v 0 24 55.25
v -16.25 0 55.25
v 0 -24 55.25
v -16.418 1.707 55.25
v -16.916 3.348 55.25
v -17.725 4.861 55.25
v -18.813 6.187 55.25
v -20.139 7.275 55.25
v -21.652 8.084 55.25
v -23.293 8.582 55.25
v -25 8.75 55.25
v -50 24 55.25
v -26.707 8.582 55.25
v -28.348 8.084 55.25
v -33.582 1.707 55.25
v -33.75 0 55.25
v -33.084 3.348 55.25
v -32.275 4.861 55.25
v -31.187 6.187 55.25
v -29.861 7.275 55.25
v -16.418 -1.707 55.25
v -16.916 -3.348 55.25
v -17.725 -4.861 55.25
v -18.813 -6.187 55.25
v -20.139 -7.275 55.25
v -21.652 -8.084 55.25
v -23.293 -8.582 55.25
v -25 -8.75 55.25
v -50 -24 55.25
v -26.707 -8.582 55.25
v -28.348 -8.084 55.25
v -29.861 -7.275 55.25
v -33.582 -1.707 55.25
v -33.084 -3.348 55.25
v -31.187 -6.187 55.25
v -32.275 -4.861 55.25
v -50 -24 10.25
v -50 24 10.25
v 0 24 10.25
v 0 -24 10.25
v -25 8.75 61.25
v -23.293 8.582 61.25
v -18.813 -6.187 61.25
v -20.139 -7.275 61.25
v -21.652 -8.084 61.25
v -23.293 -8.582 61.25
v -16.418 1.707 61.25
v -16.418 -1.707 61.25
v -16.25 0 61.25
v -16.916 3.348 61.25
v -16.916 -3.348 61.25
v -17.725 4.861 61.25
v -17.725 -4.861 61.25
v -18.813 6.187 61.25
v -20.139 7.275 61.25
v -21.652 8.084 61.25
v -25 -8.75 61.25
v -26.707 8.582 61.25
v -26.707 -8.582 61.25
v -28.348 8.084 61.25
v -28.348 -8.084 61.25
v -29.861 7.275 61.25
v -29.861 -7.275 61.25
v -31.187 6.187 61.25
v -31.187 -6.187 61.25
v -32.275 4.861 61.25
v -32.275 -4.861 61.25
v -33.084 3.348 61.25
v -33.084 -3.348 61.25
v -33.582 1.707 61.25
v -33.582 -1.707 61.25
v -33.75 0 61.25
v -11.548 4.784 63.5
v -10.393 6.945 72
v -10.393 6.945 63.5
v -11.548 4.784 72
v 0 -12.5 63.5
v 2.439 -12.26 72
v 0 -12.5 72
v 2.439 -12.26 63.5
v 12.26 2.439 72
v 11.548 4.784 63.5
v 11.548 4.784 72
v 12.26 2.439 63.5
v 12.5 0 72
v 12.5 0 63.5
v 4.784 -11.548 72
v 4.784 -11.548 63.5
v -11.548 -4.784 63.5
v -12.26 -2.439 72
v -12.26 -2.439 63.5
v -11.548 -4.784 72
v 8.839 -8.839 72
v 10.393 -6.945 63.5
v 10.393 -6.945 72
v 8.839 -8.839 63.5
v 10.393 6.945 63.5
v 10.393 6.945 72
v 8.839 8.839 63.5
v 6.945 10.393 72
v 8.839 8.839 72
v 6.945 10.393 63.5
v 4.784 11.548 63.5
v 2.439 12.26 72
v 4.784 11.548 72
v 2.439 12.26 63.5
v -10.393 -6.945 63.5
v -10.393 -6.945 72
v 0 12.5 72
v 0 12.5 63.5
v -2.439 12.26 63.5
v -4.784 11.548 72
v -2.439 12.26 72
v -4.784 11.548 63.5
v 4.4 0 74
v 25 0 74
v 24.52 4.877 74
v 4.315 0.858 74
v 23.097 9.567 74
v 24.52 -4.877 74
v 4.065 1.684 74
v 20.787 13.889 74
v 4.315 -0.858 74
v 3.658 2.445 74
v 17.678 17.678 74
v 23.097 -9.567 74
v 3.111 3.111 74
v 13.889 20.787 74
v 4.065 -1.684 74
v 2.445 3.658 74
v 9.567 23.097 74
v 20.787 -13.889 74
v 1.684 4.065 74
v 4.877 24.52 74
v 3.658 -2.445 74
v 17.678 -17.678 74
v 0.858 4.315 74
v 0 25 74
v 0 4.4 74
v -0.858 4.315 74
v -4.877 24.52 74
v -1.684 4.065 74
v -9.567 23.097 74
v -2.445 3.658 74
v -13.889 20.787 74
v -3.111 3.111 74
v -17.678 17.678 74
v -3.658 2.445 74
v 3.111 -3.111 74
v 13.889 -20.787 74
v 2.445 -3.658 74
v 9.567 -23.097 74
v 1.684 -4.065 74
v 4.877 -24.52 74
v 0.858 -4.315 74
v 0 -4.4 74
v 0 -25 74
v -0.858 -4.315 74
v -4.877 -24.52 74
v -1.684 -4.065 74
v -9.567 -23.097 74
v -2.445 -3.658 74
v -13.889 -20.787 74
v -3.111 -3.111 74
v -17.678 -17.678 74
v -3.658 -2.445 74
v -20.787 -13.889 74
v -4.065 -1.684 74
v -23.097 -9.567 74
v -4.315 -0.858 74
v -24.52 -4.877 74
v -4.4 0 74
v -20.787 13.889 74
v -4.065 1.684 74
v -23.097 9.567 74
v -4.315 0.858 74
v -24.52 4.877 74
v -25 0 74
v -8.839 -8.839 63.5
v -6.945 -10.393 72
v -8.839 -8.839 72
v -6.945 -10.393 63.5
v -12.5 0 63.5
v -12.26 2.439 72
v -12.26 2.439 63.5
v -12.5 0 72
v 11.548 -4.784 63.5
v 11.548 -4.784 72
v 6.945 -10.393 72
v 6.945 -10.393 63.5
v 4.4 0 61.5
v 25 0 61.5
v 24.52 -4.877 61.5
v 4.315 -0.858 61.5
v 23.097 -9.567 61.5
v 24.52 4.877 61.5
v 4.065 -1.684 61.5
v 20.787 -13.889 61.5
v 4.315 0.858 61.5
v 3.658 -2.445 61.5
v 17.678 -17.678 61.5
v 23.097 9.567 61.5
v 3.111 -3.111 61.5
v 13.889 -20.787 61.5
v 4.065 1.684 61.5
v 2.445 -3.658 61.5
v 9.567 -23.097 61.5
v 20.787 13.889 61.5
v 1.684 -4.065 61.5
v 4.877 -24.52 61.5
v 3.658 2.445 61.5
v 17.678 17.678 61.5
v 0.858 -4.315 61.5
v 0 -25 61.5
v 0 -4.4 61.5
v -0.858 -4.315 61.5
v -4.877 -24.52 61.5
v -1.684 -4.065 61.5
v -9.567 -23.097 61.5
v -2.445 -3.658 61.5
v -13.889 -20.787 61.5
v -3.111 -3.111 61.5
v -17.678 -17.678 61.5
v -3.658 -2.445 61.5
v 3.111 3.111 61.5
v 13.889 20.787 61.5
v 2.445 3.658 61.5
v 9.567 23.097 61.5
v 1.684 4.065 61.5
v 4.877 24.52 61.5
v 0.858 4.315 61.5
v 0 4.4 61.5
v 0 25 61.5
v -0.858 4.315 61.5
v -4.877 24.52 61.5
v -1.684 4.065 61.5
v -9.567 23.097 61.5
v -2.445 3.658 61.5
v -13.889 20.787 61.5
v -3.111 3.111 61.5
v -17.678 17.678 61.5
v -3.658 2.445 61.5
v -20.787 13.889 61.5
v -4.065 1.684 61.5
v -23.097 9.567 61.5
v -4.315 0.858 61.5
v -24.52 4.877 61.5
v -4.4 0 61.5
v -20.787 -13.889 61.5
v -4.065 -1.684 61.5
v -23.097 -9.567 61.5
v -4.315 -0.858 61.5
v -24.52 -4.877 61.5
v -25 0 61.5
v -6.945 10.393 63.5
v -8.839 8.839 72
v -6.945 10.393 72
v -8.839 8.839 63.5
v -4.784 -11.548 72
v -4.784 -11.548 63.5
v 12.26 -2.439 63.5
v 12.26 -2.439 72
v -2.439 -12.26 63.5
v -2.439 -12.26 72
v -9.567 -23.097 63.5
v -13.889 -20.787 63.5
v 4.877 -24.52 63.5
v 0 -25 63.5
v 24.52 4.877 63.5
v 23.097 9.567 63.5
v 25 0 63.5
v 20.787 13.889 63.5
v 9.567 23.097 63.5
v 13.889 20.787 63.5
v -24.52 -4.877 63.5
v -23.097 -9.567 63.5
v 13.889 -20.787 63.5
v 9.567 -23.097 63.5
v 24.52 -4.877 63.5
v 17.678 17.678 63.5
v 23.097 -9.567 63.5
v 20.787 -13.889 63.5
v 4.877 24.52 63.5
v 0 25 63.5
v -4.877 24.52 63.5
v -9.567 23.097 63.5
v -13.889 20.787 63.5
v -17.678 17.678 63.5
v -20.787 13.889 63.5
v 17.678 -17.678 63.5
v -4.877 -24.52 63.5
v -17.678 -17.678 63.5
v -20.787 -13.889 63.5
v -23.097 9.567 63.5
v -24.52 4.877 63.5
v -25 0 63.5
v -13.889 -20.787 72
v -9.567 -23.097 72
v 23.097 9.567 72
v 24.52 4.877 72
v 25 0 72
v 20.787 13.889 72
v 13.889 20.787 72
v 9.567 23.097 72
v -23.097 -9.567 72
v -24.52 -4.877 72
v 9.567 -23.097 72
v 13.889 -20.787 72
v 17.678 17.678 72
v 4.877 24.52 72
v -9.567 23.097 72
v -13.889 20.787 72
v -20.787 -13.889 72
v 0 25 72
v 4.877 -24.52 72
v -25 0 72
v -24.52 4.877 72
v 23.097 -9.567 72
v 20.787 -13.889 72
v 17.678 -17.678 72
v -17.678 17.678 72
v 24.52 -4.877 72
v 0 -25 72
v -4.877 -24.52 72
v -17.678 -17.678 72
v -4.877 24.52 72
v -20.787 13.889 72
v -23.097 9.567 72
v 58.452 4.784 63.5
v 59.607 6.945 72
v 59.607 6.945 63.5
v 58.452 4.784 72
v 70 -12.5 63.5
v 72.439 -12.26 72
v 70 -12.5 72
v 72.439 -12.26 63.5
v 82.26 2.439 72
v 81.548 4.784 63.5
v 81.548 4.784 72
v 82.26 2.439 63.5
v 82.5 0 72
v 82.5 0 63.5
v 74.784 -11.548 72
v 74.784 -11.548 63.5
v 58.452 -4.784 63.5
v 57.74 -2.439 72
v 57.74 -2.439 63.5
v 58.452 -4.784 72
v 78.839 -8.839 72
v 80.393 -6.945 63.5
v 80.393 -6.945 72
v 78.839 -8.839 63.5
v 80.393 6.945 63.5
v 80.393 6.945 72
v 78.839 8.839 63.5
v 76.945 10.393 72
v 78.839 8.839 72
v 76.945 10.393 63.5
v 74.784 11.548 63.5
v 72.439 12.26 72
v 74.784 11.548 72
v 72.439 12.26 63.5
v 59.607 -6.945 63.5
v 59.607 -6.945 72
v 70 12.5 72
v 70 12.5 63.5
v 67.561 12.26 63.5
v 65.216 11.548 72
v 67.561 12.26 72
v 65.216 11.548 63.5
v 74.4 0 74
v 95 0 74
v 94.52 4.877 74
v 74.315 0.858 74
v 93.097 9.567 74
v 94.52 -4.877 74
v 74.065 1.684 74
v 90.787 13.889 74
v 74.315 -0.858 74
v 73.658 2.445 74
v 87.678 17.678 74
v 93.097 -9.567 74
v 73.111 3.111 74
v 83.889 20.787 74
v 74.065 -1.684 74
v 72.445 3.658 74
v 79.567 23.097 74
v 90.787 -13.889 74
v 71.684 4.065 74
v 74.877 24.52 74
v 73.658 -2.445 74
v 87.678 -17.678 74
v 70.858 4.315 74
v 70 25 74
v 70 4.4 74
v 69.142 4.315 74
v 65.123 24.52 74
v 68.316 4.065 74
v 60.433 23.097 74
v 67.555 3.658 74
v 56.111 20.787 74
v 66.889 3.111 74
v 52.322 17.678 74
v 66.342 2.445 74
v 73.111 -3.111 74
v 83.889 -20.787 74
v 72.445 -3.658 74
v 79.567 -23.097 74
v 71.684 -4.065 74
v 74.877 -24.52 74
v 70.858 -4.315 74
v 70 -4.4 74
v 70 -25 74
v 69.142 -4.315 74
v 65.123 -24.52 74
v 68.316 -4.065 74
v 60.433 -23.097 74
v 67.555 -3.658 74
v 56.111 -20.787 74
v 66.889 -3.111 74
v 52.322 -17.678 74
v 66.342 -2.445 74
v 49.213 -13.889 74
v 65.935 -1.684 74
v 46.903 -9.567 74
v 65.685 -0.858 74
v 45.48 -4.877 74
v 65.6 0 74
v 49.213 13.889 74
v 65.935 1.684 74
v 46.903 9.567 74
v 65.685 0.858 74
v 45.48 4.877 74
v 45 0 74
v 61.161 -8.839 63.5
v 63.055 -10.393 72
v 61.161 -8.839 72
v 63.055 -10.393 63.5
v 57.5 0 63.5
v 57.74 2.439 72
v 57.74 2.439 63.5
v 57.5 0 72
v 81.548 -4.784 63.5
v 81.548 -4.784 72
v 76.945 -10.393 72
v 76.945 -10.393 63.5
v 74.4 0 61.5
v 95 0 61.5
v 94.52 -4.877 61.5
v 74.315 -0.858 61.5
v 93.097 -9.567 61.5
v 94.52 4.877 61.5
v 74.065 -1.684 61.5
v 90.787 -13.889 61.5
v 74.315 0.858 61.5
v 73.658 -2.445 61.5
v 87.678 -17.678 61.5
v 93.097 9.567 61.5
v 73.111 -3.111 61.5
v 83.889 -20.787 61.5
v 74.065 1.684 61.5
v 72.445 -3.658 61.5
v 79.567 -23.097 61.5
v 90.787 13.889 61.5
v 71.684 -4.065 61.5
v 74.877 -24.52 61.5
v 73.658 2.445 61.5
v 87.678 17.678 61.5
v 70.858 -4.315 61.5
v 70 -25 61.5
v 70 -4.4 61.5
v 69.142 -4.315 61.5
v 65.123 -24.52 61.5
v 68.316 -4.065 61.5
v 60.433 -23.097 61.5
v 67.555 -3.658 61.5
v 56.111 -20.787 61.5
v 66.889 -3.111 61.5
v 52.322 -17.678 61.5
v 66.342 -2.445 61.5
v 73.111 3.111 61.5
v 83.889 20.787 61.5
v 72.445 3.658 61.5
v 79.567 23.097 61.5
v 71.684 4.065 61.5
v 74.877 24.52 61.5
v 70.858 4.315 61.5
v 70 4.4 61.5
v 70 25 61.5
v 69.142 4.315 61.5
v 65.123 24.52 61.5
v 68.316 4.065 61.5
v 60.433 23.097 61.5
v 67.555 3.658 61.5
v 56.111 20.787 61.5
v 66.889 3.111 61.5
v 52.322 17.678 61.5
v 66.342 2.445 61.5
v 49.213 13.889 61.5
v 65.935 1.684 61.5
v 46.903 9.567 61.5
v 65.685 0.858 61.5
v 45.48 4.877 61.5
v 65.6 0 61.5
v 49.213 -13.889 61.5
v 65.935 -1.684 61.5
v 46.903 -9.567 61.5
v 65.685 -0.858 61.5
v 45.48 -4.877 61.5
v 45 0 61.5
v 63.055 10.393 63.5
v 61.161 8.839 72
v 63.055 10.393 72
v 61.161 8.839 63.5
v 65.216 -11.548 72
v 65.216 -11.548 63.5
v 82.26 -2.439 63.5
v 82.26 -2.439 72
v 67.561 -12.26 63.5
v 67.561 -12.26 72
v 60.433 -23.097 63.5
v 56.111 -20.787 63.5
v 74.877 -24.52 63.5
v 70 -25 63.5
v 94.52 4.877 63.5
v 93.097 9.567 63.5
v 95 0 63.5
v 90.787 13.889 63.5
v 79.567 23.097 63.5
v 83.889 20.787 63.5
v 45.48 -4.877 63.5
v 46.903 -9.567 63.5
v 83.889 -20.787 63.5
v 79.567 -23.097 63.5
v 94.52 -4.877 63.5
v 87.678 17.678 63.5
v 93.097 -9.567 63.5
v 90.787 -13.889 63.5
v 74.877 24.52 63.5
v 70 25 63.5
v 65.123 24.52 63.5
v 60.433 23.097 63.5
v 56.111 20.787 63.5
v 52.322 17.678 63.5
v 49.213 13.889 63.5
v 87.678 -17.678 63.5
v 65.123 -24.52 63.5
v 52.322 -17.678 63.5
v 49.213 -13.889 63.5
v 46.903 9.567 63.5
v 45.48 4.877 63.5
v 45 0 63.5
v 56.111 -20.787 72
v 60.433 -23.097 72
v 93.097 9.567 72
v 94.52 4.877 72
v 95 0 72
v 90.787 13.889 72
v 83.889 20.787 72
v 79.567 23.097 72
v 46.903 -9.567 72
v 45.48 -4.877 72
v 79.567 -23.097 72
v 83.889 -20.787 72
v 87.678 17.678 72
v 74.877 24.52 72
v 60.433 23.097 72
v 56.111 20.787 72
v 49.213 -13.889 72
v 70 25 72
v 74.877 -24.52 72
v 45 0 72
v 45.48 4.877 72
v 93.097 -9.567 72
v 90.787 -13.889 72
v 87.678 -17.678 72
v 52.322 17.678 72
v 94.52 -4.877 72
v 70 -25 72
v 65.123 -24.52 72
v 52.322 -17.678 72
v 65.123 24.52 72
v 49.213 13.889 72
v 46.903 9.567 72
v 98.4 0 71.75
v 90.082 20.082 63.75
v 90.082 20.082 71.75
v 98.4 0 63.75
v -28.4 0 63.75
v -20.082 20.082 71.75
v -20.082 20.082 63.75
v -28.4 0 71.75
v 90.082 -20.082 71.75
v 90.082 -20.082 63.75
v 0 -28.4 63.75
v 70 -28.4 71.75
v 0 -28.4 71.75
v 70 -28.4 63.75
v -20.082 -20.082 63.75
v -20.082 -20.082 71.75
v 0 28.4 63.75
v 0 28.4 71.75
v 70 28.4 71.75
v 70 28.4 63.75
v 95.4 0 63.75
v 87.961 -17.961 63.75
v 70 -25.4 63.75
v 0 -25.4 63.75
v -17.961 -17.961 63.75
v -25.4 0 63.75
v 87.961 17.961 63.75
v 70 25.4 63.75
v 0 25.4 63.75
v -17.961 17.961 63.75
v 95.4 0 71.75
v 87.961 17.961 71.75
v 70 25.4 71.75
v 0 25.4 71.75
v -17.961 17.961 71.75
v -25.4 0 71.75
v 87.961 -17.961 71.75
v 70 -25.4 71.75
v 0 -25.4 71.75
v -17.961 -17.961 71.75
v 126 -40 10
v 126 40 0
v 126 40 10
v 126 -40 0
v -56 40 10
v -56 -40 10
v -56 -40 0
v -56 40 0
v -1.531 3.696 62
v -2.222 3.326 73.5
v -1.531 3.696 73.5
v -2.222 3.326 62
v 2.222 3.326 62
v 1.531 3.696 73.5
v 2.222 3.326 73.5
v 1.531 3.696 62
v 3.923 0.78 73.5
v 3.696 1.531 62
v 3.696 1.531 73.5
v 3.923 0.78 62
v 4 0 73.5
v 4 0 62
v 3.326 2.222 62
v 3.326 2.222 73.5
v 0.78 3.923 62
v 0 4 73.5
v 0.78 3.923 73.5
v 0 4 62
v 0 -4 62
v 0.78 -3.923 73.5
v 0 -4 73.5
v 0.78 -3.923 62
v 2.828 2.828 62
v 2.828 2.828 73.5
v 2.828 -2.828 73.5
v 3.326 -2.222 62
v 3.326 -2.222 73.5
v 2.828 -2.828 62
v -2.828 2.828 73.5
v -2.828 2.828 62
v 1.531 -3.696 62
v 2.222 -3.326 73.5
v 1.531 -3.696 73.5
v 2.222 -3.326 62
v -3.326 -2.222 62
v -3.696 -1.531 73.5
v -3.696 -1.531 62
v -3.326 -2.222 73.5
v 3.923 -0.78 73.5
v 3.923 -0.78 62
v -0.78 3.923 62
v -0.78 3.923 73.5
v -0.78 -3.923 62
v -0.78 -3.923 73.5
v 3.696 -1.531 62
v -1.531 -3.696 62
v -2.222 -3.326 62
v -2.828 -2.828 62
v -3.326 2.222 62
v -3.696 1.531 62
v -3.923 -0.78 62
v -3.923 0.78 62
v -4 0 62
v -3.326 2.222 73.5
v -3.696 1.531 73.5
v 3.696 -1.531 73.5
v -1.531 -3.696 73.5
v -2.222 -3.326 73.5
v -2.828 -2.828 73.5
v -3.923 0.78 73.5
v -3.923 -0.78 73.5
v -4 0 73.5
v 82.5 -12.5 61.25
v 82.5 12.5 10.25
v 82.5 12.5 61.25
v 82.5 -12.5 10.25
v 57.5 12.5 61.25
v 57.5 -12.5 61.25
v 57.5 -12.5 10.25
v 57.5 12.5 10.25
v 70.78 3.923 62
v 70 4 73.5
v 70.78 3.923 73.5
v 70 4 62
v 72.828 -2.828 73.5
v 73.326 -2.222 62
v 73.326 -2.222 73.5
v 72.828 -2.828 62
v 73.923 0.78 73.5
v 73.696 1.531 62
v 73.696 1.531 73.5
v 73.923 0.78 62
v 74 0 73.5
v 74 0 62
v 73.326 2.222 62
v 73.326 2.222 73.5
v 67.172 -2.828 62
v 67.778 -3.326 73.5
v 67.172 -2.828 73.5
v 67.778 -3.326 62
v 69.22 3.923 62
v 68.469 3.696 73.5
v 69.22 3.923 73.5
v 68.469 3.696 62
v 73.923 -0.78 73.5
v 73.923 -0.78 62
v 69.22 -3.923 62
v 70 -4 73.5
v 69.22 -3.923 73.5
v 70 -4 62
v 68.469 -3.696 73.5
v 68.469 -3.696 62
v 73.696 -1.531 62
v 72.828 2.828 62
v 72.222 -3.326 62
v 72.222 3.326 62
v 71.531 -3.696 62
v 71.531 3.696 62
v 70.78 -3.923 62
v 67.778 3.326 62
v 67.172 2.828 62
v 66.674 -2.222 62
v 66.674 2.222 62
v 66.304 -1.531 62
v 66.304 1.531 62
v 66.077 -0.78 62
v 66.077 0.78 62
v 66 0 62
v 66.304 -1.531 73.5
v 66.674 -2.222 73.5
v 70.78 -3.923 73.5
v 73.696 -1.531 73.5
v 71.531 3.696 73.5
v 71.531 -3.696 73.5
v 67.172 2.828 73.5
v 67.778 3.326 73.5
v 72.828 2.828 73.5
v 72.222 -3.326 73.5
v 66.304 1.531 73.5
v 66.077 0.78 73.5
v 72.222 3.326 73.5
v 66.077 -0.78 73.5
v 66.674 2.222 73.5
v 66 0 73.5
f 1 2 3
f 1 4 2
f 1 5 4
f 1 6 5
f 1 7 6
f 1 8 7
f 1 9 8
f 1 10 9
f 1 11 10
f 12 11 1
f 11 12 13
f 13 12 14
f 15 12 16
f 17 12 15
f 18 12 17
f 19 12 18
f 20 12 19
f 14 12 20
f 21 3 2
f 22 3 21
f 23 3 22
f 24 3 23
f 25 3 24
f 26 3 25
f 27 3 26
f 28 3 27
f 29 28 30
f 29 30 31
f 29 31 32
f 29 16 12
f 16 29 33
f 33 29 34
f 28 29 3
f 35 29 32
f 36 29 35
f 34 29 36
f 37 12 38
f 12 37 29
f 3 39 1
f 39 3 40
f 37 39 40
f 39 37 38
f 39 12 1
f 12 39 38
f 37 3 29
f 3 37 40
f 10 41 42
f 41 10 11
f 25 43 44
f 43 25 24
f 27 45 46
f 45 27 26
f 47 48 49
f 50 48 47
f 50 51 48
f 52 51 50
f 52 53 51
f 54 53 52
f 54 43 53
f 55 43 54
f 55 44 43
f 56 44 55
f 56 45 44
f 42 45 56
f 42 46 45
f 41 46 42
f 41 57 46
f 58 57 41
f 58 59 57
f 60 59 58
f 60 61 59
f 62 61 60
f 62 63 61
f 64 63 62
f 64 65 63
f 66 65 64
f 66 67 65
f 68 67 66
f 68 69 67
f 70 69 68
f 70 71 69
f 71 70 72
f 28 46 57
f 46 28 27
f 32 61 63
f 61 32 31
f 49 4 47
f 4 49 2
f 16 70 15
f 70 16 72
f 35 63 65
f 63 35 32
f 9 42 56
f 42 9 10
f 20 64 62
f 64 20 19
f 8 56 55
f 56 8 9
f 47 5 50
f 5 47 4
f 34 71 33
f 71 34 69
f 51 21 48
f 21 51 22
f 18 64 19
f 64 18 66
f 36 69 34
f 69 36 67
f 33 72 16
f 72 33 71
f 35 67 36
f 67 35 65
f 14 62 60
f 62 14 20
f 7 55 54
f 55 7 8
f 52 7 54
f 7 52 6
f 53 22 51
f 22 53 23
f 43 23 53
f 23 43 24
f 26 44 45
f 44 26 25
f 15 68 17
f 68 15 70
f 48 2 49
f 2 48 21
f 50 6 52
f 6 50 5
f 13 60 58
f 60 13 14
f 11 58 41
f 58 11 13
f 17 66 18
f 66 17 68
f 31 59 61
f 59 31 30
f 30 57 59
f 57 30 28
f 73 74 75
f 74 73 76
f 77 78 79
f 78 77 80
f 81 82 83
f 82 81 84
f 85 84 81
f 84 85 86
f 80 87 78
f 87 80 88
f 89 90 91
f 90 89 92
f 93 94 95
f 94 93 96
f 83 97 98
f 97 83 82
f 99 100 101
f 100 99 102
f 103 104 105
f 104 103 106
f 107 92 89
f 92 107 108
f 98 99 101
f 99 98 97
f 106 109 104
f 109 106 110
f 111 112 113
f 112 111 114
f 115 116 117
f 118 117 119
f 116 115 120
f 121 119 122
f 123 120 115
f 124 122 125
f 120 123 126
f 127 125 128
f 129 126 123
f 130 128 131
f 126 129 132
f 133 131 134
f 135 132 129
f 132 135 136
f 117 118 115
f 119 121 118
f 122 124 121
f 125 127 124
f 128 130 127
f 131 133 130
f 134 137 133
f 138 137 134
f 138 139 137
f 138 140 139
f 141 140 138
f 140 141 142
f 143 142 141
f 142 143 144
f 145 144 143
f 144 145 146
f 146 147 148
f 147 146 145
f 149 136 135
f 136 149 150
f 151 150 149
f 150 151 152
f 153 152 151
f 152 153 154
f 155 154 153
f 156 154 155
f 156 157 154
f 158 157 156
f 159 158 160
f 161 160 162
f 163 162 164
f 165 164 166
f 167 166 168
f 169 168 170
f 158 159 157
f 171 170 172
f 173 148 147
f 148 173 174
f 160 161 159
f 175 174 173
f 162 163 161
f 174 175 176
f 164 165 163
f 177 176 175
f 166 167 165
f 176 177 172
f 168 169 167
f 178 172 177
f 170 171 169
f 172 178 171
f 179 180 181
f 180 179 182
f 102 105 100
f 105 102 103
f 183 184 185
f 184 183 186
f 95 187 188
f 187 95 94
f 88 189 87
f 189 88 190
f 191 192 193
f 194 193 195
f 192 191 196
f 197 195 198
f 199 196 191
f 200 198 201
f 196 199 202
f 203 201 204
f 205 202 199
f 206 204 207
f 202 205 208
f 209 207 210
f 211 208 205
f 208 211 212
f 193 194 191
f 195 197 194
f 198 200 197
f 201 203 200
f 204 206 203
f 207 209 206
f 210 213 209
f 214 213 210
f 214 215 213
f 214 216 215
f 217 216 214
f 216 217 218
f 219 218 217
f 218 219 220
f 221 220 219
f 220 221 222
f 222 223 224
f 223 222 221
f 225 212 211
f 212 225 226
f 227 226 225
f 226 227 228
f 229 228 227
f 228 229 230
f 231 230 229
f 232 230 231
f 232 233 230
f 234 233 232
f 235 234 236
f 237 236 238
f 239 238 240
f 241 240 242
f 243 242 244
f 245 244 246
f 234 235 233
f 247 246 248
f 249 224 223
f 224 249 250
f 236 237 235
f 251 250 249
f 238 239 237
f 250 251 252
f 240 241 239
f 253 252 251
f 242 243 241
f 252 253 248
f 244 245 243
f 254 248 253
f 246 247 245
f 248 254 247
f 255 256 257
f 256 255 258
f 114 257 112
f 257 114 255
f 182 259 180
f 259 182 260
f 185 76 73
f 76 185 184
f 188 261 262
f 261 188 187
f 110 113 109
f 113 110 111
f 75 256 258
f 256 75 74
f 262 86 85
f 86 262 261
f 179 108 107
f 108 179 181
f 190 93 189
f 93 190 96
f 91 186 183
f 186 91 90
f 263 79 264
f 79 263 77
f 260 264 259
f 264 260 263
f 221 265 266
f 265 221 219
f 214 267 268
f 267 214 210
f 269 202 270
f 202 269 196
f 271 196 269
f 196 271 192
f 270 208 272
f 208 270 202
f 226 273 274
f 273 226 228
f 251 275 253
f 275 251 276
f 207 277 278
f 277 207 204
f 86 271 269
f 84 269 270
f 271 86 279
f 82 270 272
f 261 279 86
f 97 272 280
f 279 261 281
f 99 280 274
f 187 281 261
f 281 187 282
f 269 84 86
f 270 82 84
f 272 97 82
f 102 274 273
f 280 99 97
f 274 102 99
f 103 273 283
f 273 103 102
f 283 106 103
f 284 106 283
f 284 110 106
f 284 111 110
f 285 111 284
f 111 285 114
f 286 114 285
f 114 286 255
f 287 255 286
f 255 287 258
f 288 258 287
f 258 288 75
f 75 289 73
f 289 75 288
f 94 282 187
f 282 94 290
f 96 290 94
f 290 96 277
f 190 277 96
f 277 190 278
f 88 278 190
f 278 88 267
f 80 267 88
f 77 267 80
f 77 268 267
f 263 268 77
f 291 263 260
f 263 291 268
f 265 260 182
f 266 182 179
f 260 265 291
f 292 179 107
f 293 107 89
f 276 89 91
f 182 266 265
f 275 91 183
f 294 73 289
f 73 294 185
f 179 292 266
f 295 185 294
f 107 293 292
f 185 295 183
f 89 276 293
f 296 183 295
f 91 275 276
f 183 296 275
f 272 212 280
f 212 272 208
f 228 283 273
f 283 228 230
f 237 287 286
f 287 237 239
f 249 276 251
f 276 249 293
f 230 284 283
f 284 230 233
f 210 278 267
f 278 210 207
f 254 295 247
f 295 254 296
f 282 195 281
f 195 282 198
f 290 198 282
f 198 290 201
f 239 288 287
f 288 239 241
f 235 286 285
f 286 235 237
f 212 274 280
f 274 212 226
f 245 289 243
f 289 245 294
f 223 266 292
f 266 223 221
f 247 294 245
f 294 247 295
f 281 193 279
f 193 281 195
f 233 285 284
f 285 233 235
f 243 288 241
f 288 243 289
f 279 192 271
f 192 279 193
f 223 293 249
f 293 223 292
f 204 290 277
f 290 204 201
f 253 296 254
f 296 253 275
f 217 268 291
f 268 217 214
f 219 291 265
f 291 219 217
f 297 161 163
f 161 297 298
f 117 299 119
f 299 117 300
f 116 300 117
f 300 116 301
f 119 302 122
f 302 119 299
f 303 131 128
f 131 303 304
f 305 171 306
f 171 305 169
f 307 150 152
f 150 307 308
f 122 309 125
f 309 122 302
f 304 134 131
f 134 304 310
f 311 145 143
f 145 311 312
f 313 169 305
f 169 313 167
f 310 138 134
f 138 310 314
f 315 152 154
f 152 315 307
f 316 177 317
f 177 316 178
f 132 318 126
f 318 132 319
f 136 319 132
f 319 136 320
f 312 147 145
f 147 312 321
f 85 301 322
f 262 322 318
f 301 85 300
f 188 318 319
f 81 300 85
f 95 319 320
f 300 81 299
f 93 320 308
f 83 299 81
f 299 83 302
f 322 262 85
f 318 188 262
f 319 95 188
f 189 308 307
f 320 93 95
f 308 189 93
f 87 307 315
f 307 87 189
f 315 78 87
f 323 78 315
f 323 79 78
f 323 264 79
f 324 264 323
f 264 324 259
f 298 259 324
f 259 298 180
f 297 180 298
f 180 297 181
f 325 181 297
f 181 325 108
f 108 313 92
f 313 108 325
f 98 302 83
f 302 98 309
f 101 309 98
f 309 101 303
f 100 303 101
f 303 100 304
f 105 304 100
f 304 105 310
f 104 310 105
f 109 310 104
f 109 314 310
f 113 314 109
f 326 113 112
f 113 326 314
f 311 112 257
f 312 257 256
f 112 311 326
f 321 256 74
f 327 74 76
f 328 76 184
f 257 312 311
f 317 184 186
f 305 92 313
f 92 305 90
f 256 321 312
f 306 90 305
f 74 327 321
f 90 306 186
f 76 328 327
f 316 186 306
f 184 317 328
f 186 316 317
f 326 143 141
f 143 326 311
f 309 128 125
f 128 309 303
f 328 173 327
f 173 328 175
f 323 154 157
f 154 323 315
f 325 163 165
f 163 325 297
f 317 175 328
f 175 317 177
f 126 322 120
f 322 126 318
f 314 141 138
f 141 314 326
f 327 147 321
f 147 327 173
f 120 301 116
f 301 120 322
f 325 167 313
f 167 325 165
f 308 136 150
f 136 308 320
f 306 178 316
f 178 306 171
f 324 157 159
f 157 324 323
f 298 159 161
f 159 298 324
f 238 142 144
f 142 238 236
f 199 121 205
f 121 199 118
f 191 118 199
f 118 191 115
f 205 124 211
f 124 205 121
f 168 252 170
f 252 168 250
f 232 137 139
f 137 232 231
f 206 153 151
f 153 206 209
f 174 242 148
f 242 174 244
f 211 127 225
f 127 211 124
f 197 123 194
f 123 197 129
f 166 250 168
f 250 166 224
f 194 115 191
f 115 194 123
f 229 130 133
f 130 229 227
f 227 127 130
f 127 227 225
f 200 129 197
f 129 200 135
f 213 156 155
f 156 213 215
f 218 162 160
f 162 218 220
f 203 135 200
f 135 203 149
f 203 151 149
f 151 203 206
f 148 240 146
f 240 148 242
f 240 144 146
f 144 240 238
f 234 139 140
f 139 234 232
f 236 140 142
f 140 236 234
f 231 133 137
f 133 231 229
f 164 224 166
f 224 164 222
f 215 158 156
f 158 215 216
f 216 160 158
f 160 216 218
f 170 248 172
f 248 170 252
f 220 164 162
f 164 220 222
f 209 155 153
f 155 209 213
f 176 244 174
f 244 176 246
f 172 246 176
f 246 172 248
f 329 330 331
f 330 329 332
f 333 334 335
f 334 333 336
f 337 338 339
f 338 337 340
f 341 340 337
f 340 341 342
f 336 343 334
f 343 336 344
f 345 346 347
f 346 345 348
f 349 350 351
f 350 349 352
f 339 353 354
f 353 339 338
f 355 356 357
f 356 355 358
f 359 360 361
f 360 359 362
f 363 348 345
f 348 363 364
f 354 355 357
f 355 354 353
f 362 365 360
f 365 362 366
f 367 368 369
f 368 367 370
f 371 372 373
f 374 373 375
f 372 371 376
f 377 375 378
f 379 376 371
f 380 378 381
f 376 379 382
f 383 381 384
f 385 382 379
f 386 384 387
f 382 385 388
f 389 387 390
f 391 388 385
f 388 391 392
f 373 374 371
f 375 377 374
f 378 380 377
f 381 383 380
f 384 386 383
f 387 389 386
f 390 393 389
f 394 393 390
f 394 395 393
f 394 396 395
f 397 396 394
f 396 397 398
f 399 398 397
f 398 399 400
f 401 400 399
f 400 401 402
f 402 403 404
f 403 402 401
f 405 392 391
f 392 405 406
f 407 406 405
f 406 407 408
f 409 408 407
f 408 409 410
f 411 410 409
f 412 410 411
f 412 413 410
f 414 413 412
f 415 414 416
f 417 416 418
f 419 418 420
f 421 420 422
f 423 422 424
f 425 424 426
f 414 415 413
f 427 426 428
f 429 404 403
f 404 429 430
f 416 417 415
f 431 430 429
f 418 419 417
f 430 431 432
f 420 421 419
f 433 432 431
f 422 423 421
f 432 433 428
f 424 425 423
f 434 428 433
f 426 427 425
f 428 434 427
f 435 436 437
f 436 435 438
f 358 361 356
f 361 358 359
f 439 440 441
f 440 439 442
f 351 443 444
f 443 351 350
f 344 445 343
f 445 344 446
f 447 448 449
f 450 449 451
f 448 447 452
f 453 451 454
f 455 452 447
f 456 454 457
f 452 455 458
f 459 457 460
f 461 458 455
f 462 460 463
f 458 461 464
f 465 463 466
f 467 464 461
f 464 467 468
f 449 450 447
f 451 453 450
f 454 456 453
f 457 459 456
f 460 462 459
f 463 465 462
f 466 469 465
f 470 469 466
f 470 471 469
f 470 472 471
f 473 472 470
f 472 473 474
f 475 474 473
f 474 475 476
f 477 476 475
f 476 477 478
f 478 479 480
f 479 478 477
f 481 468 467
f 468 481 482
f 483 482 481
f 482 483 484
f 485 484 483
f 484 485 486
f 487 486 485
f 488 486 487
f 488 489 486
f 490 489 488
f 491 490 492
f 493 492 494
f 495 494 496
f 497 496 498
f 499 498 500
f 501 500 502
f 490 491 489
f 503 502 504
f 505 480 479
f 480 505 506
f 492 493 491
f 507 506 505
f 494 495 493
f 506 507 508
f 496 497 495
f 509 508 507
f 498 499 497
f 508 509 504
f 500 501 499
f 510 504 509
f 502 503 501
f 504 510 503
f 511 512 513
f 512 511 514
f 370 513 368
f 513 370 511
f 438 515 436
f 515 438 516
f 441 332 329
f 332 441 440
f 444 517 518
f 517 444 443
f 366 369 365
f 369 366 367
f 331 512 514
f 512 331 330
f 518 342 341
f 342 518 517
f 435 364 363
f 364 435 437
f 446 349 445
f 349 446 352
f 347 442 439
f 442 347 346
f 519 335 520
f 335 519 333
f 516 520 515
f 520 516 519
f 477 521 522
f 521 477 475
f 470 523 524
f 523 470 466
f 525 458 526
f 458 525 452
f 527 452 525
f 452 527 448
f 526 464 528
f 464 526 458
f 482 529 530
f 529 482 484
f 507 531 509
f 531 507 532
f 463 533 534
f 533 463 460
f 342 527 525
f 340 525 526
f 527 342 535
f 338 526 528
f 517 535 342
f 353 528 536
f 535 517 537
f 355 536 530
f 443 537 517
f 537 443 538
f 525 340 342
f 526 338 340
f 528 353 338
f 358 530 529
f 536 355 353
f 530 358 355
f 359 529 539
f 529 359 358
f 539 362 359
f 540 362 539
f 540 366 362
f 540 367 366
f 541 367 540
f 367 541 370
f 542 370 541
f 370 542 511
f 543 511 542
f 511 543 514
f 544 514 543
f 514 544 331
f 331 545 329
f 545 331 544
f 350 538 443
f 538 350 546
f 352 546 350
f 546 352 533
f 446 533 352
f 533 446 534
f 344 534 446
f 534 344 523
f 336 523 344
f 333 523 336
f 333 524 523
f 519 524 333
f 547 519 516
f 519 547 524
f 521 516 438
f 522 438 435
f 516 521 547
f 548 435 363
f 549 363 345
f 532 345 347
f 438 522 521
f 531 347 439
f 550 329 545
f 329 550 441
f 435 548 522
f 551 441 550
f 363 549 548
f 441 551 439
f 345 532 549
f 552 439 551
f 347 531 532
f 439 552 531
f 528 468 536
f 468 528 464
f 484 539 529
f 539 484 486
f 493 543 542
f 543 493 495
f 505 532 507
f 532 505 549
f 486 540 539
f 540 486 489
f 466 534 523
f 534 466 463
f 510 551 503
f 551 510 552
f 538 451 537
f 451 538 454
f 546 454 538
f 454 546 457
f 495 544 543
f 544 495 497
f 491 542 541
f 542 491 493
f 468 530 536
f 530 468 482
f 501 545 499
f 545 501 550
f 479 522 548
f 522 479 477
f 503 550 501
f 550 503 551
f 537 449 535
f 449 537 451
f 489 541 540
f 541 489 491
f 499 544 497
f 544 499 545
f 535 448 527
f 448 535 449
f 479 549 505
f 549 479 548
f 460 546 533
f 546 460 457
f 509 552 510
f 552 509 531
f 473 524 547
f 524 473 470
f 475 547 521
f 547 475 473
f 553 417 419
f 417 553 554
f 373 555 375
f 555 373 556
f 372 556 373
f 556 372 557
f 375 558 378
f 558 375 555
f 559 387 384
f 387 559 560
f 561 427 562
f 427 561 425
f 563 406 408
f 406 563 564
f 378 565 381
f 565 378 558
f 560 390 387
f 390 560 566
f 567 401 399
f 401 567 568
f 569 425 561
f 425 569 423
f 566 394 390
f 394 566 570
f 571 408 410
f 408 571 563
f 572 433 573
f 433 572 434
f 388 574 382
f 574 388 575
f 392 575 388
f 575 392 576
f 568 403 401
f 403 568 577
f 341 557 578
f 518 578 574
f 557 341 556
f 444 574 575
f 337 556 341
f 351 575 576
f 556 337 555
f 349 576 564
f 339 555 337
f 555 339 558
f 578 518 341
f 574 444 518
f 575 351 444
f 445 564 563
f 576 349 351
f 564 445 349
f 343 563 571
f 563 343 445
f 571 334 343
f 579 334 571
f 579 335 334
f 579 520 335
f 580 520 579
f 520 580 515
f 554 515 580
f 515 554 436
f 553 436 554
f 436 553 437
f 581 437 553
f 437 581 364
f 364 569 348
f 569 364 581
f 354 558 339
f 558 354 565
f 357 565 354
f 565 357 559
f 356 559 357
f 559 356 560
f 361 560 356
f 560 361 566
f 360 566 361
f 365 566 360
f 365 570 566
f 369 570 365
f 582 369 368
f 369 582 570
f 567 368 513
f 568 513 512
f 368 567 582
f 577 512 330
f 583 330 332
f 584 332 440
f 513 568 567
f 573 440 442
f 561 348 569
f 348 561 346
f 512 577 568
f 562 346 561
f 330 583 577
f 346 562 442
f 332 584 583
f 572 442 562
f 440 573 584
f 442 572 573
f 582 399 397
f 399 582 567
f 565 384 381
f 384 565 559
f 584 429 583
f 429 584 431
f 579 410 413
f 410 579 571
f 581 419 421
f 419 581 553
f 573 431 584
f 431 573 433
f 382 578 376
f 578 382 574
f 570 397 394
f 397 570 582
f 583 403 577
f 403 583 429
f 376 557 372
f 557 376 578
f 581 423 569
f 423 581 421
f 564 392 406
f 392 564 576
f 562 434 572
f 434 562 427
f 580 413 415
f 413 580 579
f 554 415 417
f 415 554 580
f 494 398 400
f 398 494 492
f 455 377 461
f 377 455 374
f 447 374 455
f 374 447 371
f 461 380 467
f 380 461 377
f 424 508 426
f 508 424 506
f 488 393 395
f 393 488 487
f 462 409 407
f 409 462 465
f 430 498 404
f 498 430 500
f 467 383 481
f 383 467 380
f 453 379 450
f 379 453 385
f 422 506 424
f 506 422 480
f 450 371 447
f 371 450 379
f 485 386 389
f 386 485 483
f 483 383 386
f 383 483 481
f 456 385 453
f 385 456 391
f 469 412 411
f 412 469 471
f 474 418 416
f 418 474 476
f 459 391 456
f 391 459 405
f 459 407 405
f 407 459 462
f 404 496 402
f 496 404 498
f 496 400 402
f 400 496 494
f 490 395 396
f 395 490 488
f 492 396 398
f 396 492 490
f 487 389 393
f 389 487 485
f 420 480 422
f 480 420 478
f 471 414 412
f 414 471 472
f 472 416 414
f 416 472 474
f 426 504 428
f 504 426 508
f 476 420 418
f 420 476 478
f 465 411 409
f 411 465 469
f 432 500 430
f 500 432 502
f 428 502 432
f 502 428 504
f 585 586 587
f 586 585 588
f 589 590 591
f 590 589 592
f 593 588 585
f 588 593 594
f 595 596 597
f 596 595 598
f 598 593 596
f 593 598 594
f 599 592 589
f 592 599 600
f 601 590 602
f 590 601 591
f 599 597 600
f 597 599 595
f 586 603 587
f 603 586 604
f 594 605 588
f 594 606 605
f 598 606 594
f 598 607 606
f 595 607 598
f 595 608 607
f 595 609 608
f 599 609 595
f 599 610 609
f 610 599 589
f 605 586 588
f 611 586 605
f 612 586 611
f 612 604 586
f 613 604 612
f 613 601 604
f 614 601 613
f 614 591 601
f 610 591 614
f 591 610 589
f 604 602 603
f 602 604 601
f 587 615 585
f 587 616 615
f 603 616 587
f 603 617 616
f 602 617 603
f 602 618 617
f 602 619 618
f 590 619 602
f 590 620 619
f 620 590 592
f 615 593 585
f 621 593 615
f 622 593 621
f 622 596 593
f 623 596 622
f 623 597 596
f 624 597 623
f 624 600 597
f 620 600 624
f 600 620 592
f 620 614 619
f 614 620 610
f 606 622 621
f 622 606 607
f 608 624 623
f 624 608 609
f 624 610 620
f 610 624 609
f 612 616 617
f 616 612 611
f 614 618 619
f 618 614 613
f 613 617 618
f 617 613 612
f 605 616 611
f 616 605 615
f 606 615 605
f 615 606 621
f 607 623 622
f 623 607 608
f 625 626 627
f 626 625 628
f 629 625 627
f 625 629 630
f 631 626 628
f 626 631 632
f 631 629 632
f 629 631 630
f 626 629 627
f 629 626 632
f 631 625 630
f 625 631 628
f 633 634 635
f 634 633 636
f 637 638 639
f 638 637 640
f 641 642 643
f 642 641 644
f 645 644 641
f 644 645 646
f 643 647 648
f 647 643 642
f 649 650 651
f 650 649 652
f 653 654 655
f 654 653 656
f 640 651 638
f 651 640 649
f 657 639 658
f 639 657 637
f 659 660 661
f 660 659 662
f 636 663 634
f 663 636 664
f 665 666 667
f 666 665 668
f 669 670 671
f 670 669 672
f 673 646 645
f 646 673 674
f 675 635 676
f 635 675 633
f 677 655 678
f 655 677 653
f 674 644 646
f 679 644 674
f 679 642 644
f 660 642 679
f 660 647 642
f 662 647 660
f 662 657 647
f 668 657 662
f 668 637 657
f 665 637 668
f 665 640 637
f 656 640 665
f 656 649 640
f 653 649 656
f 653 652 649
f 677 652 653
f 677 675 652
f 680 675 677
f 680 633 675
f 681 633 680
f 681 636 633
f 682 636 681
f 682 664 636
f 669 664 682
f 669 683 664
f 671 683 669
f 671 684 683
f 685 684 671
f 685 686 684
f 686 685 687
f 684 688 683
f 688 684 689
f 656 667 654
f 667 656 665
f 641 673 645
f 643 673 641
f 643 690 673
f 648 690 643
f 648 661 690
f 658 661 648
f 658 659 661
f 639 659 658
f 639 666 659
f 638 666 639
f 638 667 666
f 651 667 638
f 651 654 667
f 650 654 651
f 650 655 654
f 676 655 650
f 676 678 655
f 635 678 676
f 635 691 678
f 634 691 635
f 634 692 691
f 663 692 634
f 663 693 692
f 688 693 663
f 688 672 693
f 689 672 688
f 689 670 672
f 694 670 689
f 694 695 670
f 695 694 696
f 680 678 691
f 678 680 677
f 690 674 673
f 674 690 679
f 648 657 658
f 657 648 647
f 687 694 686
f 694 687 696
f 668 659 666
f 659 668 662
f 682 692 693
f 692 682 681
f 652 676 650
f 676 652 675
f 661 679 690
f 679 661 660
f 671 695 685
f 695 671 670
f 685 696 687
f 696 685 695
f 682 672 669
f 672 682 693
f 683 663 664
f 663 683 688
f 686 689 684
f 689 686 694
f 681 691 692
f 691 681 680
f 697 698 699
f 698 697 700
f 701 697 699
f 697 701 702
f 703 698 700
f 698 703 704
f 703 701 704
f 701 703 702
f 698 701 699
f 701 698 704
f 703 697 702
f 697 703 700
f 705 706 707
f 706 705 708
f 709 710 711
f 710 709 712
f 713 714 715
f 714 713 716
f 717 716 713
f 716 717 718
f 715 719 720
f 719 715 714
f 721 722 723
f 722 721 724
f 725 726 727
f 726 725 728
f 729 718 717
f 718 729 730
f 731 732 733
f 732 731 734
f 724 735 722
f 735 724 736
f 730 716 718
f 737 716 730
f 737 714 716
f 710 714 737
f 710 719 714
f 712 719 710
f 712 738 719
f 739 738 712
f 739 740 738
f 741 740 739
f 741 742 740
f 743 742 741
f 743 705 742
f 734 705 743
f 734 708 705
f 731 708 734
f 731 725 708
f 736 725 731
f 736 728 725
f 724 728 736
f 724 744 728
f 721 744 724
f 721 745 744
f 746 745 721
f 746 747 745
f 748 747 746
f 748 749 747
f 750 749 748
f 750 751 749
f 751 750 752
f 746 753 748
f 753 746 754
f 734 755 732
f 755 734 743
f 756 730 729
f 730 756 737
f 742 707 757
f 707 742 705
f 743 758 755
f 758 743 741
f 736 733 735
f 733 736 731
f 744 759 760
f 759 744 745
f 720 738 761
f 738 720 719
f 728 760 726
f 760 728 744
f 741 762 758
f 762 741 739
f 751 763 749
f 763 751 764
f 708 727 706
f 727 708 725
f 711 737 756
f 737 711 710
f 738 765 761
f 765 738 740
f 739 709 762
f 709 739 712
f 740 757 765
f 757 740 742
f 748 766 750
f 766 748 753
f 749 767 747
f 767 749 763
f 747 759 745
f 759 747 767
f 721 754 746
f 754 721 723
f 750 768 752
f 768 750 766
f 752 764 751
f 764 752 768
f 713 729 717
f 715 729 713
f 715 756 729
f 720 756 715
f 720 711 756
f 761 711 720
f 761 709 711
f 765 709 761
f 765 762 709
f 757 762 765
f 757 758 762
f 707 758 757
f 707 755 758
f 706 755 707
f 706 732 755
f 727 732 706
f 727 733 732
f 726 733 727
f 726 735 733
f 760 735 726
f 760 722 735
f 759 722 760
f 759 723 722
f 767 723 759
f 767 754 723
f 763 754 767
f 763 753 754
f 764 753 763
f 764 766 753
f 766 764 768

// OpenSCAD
$fn = 32;

// ------------------------------------------------------------------------
// Motor belt drive: span 70 mm, pulleys d50, belt 8 mm wide
// Every part is its own module, assembly() places every instance.
// ------------------------------------------------------------------------

// --- part 1 ---
module base_plate() {
  difference() {
    translate([-91, -40, 0]) cube([182, 80, 10]);
  }
}

// --- part 2 ---
module motor() {
  union() {
    translate([-22.5, -24, 0]) cube([45, 48, 50]);
    translate([25.5, 0, 25]) rotate([0, 90, 0]) cylinder(h = 6, d = 17.5, center = true);
  }
}

// --- part 3 ---
module drive_shaft() {
  translate([0, 0, -5.75]) cylinder(h = 11.5, d = 8);
}

// --- part 4 ---
module pulley_drive() {
  difference() {
    union() {
      cylinder(h = 12.5, d = 25);
      cylinder(h = 2, d = 50);
      translate([0, 0, 10.5]) cylinder(h = 2, d = 50);
    }
    translate([0, 0, -1]) cylinder(h = 14.5, d = 8.8);
  }
}

// --- part 5 ---
module idler_post() {
  translate([-12.5, -12.5, 0]) cube([25, 25, 51]);
}

// --- part 6 ---
module driven_shaft() {
  translate([0, 0, -5.75]) cylinder(h = 11.5, d = 8);
}

// --- part 7 ---
module pulley_driven() {
  difference() {
    union() {
      cylinder(h = 12.5, d = 25);
      cylinder(h = 2, d = 50);
      translate([0, 0, 10.5]) cylinder(h = 2, d = 50);
    }
    translate([0, 0, -1]) cylinder(h = 14.5, d = 8.8);
  }
}

// --- part 8 ---
module drive_belt() {
  difference() {
    linear_extrude(height = 8) polygon(points = concat([for (a = [90 : 45 : 270]) [28.4 * cos(a), 28.4 * sin(a)]], [for (a = [270 : 45 : 450]) [70 + 28.4 * cos(a), 28.4 * sin(a)]]));
    translate([0, 0, -1]) linear_extrude(height = 10) polygon(points = concat([for (a = [90 : 45 : 270]) [25.4 * cos(a), 25.4 * sin(a)]], [for (a = [270 : 45 : 450]) [70 + 25.4 * cos(a), 25.4 * sin(a)]]));
  }
}

// --- assembly ---
module assembly() {
  color([0.80, 0.24, 0.20]) translate([35, 0, 0]) rotate([0, 0, 0]) base_plate();
  color([0.20, 0.45, 0.75]) translate([0, 0, 32.75]) rotate([0, 270, 0]) motor();
  color([0.25, 0.62, 0.32]) translate([0, 0, 67.75]) rotate([0, 0, 0]) drive_shaft();
  color([0.92, 0.70, 0.18]) translate([0, 0, 61.5]) rotate([0, 0, 0]) pulley_drive();
  color([0.58, 0.35, 0.70]) translate([70, 0, 10.25]) rotate([0, 0, 0]) idler_post();
  color([0.16, 0.66, 0.66]) translate([70, 0, 67.75]) rotate([0, 0, 0]) driven_shaft();
  color([0.85, 0.48, 0.18]) translate([70, 0, 61.5]) rotate([0, 0, 0]) pulley_driven();
  color([0.55, 0.60, 0.65]) translate([0, 0, 63.75]) rotate([0, 0, 0]) drive_belt();
}

assembly();
